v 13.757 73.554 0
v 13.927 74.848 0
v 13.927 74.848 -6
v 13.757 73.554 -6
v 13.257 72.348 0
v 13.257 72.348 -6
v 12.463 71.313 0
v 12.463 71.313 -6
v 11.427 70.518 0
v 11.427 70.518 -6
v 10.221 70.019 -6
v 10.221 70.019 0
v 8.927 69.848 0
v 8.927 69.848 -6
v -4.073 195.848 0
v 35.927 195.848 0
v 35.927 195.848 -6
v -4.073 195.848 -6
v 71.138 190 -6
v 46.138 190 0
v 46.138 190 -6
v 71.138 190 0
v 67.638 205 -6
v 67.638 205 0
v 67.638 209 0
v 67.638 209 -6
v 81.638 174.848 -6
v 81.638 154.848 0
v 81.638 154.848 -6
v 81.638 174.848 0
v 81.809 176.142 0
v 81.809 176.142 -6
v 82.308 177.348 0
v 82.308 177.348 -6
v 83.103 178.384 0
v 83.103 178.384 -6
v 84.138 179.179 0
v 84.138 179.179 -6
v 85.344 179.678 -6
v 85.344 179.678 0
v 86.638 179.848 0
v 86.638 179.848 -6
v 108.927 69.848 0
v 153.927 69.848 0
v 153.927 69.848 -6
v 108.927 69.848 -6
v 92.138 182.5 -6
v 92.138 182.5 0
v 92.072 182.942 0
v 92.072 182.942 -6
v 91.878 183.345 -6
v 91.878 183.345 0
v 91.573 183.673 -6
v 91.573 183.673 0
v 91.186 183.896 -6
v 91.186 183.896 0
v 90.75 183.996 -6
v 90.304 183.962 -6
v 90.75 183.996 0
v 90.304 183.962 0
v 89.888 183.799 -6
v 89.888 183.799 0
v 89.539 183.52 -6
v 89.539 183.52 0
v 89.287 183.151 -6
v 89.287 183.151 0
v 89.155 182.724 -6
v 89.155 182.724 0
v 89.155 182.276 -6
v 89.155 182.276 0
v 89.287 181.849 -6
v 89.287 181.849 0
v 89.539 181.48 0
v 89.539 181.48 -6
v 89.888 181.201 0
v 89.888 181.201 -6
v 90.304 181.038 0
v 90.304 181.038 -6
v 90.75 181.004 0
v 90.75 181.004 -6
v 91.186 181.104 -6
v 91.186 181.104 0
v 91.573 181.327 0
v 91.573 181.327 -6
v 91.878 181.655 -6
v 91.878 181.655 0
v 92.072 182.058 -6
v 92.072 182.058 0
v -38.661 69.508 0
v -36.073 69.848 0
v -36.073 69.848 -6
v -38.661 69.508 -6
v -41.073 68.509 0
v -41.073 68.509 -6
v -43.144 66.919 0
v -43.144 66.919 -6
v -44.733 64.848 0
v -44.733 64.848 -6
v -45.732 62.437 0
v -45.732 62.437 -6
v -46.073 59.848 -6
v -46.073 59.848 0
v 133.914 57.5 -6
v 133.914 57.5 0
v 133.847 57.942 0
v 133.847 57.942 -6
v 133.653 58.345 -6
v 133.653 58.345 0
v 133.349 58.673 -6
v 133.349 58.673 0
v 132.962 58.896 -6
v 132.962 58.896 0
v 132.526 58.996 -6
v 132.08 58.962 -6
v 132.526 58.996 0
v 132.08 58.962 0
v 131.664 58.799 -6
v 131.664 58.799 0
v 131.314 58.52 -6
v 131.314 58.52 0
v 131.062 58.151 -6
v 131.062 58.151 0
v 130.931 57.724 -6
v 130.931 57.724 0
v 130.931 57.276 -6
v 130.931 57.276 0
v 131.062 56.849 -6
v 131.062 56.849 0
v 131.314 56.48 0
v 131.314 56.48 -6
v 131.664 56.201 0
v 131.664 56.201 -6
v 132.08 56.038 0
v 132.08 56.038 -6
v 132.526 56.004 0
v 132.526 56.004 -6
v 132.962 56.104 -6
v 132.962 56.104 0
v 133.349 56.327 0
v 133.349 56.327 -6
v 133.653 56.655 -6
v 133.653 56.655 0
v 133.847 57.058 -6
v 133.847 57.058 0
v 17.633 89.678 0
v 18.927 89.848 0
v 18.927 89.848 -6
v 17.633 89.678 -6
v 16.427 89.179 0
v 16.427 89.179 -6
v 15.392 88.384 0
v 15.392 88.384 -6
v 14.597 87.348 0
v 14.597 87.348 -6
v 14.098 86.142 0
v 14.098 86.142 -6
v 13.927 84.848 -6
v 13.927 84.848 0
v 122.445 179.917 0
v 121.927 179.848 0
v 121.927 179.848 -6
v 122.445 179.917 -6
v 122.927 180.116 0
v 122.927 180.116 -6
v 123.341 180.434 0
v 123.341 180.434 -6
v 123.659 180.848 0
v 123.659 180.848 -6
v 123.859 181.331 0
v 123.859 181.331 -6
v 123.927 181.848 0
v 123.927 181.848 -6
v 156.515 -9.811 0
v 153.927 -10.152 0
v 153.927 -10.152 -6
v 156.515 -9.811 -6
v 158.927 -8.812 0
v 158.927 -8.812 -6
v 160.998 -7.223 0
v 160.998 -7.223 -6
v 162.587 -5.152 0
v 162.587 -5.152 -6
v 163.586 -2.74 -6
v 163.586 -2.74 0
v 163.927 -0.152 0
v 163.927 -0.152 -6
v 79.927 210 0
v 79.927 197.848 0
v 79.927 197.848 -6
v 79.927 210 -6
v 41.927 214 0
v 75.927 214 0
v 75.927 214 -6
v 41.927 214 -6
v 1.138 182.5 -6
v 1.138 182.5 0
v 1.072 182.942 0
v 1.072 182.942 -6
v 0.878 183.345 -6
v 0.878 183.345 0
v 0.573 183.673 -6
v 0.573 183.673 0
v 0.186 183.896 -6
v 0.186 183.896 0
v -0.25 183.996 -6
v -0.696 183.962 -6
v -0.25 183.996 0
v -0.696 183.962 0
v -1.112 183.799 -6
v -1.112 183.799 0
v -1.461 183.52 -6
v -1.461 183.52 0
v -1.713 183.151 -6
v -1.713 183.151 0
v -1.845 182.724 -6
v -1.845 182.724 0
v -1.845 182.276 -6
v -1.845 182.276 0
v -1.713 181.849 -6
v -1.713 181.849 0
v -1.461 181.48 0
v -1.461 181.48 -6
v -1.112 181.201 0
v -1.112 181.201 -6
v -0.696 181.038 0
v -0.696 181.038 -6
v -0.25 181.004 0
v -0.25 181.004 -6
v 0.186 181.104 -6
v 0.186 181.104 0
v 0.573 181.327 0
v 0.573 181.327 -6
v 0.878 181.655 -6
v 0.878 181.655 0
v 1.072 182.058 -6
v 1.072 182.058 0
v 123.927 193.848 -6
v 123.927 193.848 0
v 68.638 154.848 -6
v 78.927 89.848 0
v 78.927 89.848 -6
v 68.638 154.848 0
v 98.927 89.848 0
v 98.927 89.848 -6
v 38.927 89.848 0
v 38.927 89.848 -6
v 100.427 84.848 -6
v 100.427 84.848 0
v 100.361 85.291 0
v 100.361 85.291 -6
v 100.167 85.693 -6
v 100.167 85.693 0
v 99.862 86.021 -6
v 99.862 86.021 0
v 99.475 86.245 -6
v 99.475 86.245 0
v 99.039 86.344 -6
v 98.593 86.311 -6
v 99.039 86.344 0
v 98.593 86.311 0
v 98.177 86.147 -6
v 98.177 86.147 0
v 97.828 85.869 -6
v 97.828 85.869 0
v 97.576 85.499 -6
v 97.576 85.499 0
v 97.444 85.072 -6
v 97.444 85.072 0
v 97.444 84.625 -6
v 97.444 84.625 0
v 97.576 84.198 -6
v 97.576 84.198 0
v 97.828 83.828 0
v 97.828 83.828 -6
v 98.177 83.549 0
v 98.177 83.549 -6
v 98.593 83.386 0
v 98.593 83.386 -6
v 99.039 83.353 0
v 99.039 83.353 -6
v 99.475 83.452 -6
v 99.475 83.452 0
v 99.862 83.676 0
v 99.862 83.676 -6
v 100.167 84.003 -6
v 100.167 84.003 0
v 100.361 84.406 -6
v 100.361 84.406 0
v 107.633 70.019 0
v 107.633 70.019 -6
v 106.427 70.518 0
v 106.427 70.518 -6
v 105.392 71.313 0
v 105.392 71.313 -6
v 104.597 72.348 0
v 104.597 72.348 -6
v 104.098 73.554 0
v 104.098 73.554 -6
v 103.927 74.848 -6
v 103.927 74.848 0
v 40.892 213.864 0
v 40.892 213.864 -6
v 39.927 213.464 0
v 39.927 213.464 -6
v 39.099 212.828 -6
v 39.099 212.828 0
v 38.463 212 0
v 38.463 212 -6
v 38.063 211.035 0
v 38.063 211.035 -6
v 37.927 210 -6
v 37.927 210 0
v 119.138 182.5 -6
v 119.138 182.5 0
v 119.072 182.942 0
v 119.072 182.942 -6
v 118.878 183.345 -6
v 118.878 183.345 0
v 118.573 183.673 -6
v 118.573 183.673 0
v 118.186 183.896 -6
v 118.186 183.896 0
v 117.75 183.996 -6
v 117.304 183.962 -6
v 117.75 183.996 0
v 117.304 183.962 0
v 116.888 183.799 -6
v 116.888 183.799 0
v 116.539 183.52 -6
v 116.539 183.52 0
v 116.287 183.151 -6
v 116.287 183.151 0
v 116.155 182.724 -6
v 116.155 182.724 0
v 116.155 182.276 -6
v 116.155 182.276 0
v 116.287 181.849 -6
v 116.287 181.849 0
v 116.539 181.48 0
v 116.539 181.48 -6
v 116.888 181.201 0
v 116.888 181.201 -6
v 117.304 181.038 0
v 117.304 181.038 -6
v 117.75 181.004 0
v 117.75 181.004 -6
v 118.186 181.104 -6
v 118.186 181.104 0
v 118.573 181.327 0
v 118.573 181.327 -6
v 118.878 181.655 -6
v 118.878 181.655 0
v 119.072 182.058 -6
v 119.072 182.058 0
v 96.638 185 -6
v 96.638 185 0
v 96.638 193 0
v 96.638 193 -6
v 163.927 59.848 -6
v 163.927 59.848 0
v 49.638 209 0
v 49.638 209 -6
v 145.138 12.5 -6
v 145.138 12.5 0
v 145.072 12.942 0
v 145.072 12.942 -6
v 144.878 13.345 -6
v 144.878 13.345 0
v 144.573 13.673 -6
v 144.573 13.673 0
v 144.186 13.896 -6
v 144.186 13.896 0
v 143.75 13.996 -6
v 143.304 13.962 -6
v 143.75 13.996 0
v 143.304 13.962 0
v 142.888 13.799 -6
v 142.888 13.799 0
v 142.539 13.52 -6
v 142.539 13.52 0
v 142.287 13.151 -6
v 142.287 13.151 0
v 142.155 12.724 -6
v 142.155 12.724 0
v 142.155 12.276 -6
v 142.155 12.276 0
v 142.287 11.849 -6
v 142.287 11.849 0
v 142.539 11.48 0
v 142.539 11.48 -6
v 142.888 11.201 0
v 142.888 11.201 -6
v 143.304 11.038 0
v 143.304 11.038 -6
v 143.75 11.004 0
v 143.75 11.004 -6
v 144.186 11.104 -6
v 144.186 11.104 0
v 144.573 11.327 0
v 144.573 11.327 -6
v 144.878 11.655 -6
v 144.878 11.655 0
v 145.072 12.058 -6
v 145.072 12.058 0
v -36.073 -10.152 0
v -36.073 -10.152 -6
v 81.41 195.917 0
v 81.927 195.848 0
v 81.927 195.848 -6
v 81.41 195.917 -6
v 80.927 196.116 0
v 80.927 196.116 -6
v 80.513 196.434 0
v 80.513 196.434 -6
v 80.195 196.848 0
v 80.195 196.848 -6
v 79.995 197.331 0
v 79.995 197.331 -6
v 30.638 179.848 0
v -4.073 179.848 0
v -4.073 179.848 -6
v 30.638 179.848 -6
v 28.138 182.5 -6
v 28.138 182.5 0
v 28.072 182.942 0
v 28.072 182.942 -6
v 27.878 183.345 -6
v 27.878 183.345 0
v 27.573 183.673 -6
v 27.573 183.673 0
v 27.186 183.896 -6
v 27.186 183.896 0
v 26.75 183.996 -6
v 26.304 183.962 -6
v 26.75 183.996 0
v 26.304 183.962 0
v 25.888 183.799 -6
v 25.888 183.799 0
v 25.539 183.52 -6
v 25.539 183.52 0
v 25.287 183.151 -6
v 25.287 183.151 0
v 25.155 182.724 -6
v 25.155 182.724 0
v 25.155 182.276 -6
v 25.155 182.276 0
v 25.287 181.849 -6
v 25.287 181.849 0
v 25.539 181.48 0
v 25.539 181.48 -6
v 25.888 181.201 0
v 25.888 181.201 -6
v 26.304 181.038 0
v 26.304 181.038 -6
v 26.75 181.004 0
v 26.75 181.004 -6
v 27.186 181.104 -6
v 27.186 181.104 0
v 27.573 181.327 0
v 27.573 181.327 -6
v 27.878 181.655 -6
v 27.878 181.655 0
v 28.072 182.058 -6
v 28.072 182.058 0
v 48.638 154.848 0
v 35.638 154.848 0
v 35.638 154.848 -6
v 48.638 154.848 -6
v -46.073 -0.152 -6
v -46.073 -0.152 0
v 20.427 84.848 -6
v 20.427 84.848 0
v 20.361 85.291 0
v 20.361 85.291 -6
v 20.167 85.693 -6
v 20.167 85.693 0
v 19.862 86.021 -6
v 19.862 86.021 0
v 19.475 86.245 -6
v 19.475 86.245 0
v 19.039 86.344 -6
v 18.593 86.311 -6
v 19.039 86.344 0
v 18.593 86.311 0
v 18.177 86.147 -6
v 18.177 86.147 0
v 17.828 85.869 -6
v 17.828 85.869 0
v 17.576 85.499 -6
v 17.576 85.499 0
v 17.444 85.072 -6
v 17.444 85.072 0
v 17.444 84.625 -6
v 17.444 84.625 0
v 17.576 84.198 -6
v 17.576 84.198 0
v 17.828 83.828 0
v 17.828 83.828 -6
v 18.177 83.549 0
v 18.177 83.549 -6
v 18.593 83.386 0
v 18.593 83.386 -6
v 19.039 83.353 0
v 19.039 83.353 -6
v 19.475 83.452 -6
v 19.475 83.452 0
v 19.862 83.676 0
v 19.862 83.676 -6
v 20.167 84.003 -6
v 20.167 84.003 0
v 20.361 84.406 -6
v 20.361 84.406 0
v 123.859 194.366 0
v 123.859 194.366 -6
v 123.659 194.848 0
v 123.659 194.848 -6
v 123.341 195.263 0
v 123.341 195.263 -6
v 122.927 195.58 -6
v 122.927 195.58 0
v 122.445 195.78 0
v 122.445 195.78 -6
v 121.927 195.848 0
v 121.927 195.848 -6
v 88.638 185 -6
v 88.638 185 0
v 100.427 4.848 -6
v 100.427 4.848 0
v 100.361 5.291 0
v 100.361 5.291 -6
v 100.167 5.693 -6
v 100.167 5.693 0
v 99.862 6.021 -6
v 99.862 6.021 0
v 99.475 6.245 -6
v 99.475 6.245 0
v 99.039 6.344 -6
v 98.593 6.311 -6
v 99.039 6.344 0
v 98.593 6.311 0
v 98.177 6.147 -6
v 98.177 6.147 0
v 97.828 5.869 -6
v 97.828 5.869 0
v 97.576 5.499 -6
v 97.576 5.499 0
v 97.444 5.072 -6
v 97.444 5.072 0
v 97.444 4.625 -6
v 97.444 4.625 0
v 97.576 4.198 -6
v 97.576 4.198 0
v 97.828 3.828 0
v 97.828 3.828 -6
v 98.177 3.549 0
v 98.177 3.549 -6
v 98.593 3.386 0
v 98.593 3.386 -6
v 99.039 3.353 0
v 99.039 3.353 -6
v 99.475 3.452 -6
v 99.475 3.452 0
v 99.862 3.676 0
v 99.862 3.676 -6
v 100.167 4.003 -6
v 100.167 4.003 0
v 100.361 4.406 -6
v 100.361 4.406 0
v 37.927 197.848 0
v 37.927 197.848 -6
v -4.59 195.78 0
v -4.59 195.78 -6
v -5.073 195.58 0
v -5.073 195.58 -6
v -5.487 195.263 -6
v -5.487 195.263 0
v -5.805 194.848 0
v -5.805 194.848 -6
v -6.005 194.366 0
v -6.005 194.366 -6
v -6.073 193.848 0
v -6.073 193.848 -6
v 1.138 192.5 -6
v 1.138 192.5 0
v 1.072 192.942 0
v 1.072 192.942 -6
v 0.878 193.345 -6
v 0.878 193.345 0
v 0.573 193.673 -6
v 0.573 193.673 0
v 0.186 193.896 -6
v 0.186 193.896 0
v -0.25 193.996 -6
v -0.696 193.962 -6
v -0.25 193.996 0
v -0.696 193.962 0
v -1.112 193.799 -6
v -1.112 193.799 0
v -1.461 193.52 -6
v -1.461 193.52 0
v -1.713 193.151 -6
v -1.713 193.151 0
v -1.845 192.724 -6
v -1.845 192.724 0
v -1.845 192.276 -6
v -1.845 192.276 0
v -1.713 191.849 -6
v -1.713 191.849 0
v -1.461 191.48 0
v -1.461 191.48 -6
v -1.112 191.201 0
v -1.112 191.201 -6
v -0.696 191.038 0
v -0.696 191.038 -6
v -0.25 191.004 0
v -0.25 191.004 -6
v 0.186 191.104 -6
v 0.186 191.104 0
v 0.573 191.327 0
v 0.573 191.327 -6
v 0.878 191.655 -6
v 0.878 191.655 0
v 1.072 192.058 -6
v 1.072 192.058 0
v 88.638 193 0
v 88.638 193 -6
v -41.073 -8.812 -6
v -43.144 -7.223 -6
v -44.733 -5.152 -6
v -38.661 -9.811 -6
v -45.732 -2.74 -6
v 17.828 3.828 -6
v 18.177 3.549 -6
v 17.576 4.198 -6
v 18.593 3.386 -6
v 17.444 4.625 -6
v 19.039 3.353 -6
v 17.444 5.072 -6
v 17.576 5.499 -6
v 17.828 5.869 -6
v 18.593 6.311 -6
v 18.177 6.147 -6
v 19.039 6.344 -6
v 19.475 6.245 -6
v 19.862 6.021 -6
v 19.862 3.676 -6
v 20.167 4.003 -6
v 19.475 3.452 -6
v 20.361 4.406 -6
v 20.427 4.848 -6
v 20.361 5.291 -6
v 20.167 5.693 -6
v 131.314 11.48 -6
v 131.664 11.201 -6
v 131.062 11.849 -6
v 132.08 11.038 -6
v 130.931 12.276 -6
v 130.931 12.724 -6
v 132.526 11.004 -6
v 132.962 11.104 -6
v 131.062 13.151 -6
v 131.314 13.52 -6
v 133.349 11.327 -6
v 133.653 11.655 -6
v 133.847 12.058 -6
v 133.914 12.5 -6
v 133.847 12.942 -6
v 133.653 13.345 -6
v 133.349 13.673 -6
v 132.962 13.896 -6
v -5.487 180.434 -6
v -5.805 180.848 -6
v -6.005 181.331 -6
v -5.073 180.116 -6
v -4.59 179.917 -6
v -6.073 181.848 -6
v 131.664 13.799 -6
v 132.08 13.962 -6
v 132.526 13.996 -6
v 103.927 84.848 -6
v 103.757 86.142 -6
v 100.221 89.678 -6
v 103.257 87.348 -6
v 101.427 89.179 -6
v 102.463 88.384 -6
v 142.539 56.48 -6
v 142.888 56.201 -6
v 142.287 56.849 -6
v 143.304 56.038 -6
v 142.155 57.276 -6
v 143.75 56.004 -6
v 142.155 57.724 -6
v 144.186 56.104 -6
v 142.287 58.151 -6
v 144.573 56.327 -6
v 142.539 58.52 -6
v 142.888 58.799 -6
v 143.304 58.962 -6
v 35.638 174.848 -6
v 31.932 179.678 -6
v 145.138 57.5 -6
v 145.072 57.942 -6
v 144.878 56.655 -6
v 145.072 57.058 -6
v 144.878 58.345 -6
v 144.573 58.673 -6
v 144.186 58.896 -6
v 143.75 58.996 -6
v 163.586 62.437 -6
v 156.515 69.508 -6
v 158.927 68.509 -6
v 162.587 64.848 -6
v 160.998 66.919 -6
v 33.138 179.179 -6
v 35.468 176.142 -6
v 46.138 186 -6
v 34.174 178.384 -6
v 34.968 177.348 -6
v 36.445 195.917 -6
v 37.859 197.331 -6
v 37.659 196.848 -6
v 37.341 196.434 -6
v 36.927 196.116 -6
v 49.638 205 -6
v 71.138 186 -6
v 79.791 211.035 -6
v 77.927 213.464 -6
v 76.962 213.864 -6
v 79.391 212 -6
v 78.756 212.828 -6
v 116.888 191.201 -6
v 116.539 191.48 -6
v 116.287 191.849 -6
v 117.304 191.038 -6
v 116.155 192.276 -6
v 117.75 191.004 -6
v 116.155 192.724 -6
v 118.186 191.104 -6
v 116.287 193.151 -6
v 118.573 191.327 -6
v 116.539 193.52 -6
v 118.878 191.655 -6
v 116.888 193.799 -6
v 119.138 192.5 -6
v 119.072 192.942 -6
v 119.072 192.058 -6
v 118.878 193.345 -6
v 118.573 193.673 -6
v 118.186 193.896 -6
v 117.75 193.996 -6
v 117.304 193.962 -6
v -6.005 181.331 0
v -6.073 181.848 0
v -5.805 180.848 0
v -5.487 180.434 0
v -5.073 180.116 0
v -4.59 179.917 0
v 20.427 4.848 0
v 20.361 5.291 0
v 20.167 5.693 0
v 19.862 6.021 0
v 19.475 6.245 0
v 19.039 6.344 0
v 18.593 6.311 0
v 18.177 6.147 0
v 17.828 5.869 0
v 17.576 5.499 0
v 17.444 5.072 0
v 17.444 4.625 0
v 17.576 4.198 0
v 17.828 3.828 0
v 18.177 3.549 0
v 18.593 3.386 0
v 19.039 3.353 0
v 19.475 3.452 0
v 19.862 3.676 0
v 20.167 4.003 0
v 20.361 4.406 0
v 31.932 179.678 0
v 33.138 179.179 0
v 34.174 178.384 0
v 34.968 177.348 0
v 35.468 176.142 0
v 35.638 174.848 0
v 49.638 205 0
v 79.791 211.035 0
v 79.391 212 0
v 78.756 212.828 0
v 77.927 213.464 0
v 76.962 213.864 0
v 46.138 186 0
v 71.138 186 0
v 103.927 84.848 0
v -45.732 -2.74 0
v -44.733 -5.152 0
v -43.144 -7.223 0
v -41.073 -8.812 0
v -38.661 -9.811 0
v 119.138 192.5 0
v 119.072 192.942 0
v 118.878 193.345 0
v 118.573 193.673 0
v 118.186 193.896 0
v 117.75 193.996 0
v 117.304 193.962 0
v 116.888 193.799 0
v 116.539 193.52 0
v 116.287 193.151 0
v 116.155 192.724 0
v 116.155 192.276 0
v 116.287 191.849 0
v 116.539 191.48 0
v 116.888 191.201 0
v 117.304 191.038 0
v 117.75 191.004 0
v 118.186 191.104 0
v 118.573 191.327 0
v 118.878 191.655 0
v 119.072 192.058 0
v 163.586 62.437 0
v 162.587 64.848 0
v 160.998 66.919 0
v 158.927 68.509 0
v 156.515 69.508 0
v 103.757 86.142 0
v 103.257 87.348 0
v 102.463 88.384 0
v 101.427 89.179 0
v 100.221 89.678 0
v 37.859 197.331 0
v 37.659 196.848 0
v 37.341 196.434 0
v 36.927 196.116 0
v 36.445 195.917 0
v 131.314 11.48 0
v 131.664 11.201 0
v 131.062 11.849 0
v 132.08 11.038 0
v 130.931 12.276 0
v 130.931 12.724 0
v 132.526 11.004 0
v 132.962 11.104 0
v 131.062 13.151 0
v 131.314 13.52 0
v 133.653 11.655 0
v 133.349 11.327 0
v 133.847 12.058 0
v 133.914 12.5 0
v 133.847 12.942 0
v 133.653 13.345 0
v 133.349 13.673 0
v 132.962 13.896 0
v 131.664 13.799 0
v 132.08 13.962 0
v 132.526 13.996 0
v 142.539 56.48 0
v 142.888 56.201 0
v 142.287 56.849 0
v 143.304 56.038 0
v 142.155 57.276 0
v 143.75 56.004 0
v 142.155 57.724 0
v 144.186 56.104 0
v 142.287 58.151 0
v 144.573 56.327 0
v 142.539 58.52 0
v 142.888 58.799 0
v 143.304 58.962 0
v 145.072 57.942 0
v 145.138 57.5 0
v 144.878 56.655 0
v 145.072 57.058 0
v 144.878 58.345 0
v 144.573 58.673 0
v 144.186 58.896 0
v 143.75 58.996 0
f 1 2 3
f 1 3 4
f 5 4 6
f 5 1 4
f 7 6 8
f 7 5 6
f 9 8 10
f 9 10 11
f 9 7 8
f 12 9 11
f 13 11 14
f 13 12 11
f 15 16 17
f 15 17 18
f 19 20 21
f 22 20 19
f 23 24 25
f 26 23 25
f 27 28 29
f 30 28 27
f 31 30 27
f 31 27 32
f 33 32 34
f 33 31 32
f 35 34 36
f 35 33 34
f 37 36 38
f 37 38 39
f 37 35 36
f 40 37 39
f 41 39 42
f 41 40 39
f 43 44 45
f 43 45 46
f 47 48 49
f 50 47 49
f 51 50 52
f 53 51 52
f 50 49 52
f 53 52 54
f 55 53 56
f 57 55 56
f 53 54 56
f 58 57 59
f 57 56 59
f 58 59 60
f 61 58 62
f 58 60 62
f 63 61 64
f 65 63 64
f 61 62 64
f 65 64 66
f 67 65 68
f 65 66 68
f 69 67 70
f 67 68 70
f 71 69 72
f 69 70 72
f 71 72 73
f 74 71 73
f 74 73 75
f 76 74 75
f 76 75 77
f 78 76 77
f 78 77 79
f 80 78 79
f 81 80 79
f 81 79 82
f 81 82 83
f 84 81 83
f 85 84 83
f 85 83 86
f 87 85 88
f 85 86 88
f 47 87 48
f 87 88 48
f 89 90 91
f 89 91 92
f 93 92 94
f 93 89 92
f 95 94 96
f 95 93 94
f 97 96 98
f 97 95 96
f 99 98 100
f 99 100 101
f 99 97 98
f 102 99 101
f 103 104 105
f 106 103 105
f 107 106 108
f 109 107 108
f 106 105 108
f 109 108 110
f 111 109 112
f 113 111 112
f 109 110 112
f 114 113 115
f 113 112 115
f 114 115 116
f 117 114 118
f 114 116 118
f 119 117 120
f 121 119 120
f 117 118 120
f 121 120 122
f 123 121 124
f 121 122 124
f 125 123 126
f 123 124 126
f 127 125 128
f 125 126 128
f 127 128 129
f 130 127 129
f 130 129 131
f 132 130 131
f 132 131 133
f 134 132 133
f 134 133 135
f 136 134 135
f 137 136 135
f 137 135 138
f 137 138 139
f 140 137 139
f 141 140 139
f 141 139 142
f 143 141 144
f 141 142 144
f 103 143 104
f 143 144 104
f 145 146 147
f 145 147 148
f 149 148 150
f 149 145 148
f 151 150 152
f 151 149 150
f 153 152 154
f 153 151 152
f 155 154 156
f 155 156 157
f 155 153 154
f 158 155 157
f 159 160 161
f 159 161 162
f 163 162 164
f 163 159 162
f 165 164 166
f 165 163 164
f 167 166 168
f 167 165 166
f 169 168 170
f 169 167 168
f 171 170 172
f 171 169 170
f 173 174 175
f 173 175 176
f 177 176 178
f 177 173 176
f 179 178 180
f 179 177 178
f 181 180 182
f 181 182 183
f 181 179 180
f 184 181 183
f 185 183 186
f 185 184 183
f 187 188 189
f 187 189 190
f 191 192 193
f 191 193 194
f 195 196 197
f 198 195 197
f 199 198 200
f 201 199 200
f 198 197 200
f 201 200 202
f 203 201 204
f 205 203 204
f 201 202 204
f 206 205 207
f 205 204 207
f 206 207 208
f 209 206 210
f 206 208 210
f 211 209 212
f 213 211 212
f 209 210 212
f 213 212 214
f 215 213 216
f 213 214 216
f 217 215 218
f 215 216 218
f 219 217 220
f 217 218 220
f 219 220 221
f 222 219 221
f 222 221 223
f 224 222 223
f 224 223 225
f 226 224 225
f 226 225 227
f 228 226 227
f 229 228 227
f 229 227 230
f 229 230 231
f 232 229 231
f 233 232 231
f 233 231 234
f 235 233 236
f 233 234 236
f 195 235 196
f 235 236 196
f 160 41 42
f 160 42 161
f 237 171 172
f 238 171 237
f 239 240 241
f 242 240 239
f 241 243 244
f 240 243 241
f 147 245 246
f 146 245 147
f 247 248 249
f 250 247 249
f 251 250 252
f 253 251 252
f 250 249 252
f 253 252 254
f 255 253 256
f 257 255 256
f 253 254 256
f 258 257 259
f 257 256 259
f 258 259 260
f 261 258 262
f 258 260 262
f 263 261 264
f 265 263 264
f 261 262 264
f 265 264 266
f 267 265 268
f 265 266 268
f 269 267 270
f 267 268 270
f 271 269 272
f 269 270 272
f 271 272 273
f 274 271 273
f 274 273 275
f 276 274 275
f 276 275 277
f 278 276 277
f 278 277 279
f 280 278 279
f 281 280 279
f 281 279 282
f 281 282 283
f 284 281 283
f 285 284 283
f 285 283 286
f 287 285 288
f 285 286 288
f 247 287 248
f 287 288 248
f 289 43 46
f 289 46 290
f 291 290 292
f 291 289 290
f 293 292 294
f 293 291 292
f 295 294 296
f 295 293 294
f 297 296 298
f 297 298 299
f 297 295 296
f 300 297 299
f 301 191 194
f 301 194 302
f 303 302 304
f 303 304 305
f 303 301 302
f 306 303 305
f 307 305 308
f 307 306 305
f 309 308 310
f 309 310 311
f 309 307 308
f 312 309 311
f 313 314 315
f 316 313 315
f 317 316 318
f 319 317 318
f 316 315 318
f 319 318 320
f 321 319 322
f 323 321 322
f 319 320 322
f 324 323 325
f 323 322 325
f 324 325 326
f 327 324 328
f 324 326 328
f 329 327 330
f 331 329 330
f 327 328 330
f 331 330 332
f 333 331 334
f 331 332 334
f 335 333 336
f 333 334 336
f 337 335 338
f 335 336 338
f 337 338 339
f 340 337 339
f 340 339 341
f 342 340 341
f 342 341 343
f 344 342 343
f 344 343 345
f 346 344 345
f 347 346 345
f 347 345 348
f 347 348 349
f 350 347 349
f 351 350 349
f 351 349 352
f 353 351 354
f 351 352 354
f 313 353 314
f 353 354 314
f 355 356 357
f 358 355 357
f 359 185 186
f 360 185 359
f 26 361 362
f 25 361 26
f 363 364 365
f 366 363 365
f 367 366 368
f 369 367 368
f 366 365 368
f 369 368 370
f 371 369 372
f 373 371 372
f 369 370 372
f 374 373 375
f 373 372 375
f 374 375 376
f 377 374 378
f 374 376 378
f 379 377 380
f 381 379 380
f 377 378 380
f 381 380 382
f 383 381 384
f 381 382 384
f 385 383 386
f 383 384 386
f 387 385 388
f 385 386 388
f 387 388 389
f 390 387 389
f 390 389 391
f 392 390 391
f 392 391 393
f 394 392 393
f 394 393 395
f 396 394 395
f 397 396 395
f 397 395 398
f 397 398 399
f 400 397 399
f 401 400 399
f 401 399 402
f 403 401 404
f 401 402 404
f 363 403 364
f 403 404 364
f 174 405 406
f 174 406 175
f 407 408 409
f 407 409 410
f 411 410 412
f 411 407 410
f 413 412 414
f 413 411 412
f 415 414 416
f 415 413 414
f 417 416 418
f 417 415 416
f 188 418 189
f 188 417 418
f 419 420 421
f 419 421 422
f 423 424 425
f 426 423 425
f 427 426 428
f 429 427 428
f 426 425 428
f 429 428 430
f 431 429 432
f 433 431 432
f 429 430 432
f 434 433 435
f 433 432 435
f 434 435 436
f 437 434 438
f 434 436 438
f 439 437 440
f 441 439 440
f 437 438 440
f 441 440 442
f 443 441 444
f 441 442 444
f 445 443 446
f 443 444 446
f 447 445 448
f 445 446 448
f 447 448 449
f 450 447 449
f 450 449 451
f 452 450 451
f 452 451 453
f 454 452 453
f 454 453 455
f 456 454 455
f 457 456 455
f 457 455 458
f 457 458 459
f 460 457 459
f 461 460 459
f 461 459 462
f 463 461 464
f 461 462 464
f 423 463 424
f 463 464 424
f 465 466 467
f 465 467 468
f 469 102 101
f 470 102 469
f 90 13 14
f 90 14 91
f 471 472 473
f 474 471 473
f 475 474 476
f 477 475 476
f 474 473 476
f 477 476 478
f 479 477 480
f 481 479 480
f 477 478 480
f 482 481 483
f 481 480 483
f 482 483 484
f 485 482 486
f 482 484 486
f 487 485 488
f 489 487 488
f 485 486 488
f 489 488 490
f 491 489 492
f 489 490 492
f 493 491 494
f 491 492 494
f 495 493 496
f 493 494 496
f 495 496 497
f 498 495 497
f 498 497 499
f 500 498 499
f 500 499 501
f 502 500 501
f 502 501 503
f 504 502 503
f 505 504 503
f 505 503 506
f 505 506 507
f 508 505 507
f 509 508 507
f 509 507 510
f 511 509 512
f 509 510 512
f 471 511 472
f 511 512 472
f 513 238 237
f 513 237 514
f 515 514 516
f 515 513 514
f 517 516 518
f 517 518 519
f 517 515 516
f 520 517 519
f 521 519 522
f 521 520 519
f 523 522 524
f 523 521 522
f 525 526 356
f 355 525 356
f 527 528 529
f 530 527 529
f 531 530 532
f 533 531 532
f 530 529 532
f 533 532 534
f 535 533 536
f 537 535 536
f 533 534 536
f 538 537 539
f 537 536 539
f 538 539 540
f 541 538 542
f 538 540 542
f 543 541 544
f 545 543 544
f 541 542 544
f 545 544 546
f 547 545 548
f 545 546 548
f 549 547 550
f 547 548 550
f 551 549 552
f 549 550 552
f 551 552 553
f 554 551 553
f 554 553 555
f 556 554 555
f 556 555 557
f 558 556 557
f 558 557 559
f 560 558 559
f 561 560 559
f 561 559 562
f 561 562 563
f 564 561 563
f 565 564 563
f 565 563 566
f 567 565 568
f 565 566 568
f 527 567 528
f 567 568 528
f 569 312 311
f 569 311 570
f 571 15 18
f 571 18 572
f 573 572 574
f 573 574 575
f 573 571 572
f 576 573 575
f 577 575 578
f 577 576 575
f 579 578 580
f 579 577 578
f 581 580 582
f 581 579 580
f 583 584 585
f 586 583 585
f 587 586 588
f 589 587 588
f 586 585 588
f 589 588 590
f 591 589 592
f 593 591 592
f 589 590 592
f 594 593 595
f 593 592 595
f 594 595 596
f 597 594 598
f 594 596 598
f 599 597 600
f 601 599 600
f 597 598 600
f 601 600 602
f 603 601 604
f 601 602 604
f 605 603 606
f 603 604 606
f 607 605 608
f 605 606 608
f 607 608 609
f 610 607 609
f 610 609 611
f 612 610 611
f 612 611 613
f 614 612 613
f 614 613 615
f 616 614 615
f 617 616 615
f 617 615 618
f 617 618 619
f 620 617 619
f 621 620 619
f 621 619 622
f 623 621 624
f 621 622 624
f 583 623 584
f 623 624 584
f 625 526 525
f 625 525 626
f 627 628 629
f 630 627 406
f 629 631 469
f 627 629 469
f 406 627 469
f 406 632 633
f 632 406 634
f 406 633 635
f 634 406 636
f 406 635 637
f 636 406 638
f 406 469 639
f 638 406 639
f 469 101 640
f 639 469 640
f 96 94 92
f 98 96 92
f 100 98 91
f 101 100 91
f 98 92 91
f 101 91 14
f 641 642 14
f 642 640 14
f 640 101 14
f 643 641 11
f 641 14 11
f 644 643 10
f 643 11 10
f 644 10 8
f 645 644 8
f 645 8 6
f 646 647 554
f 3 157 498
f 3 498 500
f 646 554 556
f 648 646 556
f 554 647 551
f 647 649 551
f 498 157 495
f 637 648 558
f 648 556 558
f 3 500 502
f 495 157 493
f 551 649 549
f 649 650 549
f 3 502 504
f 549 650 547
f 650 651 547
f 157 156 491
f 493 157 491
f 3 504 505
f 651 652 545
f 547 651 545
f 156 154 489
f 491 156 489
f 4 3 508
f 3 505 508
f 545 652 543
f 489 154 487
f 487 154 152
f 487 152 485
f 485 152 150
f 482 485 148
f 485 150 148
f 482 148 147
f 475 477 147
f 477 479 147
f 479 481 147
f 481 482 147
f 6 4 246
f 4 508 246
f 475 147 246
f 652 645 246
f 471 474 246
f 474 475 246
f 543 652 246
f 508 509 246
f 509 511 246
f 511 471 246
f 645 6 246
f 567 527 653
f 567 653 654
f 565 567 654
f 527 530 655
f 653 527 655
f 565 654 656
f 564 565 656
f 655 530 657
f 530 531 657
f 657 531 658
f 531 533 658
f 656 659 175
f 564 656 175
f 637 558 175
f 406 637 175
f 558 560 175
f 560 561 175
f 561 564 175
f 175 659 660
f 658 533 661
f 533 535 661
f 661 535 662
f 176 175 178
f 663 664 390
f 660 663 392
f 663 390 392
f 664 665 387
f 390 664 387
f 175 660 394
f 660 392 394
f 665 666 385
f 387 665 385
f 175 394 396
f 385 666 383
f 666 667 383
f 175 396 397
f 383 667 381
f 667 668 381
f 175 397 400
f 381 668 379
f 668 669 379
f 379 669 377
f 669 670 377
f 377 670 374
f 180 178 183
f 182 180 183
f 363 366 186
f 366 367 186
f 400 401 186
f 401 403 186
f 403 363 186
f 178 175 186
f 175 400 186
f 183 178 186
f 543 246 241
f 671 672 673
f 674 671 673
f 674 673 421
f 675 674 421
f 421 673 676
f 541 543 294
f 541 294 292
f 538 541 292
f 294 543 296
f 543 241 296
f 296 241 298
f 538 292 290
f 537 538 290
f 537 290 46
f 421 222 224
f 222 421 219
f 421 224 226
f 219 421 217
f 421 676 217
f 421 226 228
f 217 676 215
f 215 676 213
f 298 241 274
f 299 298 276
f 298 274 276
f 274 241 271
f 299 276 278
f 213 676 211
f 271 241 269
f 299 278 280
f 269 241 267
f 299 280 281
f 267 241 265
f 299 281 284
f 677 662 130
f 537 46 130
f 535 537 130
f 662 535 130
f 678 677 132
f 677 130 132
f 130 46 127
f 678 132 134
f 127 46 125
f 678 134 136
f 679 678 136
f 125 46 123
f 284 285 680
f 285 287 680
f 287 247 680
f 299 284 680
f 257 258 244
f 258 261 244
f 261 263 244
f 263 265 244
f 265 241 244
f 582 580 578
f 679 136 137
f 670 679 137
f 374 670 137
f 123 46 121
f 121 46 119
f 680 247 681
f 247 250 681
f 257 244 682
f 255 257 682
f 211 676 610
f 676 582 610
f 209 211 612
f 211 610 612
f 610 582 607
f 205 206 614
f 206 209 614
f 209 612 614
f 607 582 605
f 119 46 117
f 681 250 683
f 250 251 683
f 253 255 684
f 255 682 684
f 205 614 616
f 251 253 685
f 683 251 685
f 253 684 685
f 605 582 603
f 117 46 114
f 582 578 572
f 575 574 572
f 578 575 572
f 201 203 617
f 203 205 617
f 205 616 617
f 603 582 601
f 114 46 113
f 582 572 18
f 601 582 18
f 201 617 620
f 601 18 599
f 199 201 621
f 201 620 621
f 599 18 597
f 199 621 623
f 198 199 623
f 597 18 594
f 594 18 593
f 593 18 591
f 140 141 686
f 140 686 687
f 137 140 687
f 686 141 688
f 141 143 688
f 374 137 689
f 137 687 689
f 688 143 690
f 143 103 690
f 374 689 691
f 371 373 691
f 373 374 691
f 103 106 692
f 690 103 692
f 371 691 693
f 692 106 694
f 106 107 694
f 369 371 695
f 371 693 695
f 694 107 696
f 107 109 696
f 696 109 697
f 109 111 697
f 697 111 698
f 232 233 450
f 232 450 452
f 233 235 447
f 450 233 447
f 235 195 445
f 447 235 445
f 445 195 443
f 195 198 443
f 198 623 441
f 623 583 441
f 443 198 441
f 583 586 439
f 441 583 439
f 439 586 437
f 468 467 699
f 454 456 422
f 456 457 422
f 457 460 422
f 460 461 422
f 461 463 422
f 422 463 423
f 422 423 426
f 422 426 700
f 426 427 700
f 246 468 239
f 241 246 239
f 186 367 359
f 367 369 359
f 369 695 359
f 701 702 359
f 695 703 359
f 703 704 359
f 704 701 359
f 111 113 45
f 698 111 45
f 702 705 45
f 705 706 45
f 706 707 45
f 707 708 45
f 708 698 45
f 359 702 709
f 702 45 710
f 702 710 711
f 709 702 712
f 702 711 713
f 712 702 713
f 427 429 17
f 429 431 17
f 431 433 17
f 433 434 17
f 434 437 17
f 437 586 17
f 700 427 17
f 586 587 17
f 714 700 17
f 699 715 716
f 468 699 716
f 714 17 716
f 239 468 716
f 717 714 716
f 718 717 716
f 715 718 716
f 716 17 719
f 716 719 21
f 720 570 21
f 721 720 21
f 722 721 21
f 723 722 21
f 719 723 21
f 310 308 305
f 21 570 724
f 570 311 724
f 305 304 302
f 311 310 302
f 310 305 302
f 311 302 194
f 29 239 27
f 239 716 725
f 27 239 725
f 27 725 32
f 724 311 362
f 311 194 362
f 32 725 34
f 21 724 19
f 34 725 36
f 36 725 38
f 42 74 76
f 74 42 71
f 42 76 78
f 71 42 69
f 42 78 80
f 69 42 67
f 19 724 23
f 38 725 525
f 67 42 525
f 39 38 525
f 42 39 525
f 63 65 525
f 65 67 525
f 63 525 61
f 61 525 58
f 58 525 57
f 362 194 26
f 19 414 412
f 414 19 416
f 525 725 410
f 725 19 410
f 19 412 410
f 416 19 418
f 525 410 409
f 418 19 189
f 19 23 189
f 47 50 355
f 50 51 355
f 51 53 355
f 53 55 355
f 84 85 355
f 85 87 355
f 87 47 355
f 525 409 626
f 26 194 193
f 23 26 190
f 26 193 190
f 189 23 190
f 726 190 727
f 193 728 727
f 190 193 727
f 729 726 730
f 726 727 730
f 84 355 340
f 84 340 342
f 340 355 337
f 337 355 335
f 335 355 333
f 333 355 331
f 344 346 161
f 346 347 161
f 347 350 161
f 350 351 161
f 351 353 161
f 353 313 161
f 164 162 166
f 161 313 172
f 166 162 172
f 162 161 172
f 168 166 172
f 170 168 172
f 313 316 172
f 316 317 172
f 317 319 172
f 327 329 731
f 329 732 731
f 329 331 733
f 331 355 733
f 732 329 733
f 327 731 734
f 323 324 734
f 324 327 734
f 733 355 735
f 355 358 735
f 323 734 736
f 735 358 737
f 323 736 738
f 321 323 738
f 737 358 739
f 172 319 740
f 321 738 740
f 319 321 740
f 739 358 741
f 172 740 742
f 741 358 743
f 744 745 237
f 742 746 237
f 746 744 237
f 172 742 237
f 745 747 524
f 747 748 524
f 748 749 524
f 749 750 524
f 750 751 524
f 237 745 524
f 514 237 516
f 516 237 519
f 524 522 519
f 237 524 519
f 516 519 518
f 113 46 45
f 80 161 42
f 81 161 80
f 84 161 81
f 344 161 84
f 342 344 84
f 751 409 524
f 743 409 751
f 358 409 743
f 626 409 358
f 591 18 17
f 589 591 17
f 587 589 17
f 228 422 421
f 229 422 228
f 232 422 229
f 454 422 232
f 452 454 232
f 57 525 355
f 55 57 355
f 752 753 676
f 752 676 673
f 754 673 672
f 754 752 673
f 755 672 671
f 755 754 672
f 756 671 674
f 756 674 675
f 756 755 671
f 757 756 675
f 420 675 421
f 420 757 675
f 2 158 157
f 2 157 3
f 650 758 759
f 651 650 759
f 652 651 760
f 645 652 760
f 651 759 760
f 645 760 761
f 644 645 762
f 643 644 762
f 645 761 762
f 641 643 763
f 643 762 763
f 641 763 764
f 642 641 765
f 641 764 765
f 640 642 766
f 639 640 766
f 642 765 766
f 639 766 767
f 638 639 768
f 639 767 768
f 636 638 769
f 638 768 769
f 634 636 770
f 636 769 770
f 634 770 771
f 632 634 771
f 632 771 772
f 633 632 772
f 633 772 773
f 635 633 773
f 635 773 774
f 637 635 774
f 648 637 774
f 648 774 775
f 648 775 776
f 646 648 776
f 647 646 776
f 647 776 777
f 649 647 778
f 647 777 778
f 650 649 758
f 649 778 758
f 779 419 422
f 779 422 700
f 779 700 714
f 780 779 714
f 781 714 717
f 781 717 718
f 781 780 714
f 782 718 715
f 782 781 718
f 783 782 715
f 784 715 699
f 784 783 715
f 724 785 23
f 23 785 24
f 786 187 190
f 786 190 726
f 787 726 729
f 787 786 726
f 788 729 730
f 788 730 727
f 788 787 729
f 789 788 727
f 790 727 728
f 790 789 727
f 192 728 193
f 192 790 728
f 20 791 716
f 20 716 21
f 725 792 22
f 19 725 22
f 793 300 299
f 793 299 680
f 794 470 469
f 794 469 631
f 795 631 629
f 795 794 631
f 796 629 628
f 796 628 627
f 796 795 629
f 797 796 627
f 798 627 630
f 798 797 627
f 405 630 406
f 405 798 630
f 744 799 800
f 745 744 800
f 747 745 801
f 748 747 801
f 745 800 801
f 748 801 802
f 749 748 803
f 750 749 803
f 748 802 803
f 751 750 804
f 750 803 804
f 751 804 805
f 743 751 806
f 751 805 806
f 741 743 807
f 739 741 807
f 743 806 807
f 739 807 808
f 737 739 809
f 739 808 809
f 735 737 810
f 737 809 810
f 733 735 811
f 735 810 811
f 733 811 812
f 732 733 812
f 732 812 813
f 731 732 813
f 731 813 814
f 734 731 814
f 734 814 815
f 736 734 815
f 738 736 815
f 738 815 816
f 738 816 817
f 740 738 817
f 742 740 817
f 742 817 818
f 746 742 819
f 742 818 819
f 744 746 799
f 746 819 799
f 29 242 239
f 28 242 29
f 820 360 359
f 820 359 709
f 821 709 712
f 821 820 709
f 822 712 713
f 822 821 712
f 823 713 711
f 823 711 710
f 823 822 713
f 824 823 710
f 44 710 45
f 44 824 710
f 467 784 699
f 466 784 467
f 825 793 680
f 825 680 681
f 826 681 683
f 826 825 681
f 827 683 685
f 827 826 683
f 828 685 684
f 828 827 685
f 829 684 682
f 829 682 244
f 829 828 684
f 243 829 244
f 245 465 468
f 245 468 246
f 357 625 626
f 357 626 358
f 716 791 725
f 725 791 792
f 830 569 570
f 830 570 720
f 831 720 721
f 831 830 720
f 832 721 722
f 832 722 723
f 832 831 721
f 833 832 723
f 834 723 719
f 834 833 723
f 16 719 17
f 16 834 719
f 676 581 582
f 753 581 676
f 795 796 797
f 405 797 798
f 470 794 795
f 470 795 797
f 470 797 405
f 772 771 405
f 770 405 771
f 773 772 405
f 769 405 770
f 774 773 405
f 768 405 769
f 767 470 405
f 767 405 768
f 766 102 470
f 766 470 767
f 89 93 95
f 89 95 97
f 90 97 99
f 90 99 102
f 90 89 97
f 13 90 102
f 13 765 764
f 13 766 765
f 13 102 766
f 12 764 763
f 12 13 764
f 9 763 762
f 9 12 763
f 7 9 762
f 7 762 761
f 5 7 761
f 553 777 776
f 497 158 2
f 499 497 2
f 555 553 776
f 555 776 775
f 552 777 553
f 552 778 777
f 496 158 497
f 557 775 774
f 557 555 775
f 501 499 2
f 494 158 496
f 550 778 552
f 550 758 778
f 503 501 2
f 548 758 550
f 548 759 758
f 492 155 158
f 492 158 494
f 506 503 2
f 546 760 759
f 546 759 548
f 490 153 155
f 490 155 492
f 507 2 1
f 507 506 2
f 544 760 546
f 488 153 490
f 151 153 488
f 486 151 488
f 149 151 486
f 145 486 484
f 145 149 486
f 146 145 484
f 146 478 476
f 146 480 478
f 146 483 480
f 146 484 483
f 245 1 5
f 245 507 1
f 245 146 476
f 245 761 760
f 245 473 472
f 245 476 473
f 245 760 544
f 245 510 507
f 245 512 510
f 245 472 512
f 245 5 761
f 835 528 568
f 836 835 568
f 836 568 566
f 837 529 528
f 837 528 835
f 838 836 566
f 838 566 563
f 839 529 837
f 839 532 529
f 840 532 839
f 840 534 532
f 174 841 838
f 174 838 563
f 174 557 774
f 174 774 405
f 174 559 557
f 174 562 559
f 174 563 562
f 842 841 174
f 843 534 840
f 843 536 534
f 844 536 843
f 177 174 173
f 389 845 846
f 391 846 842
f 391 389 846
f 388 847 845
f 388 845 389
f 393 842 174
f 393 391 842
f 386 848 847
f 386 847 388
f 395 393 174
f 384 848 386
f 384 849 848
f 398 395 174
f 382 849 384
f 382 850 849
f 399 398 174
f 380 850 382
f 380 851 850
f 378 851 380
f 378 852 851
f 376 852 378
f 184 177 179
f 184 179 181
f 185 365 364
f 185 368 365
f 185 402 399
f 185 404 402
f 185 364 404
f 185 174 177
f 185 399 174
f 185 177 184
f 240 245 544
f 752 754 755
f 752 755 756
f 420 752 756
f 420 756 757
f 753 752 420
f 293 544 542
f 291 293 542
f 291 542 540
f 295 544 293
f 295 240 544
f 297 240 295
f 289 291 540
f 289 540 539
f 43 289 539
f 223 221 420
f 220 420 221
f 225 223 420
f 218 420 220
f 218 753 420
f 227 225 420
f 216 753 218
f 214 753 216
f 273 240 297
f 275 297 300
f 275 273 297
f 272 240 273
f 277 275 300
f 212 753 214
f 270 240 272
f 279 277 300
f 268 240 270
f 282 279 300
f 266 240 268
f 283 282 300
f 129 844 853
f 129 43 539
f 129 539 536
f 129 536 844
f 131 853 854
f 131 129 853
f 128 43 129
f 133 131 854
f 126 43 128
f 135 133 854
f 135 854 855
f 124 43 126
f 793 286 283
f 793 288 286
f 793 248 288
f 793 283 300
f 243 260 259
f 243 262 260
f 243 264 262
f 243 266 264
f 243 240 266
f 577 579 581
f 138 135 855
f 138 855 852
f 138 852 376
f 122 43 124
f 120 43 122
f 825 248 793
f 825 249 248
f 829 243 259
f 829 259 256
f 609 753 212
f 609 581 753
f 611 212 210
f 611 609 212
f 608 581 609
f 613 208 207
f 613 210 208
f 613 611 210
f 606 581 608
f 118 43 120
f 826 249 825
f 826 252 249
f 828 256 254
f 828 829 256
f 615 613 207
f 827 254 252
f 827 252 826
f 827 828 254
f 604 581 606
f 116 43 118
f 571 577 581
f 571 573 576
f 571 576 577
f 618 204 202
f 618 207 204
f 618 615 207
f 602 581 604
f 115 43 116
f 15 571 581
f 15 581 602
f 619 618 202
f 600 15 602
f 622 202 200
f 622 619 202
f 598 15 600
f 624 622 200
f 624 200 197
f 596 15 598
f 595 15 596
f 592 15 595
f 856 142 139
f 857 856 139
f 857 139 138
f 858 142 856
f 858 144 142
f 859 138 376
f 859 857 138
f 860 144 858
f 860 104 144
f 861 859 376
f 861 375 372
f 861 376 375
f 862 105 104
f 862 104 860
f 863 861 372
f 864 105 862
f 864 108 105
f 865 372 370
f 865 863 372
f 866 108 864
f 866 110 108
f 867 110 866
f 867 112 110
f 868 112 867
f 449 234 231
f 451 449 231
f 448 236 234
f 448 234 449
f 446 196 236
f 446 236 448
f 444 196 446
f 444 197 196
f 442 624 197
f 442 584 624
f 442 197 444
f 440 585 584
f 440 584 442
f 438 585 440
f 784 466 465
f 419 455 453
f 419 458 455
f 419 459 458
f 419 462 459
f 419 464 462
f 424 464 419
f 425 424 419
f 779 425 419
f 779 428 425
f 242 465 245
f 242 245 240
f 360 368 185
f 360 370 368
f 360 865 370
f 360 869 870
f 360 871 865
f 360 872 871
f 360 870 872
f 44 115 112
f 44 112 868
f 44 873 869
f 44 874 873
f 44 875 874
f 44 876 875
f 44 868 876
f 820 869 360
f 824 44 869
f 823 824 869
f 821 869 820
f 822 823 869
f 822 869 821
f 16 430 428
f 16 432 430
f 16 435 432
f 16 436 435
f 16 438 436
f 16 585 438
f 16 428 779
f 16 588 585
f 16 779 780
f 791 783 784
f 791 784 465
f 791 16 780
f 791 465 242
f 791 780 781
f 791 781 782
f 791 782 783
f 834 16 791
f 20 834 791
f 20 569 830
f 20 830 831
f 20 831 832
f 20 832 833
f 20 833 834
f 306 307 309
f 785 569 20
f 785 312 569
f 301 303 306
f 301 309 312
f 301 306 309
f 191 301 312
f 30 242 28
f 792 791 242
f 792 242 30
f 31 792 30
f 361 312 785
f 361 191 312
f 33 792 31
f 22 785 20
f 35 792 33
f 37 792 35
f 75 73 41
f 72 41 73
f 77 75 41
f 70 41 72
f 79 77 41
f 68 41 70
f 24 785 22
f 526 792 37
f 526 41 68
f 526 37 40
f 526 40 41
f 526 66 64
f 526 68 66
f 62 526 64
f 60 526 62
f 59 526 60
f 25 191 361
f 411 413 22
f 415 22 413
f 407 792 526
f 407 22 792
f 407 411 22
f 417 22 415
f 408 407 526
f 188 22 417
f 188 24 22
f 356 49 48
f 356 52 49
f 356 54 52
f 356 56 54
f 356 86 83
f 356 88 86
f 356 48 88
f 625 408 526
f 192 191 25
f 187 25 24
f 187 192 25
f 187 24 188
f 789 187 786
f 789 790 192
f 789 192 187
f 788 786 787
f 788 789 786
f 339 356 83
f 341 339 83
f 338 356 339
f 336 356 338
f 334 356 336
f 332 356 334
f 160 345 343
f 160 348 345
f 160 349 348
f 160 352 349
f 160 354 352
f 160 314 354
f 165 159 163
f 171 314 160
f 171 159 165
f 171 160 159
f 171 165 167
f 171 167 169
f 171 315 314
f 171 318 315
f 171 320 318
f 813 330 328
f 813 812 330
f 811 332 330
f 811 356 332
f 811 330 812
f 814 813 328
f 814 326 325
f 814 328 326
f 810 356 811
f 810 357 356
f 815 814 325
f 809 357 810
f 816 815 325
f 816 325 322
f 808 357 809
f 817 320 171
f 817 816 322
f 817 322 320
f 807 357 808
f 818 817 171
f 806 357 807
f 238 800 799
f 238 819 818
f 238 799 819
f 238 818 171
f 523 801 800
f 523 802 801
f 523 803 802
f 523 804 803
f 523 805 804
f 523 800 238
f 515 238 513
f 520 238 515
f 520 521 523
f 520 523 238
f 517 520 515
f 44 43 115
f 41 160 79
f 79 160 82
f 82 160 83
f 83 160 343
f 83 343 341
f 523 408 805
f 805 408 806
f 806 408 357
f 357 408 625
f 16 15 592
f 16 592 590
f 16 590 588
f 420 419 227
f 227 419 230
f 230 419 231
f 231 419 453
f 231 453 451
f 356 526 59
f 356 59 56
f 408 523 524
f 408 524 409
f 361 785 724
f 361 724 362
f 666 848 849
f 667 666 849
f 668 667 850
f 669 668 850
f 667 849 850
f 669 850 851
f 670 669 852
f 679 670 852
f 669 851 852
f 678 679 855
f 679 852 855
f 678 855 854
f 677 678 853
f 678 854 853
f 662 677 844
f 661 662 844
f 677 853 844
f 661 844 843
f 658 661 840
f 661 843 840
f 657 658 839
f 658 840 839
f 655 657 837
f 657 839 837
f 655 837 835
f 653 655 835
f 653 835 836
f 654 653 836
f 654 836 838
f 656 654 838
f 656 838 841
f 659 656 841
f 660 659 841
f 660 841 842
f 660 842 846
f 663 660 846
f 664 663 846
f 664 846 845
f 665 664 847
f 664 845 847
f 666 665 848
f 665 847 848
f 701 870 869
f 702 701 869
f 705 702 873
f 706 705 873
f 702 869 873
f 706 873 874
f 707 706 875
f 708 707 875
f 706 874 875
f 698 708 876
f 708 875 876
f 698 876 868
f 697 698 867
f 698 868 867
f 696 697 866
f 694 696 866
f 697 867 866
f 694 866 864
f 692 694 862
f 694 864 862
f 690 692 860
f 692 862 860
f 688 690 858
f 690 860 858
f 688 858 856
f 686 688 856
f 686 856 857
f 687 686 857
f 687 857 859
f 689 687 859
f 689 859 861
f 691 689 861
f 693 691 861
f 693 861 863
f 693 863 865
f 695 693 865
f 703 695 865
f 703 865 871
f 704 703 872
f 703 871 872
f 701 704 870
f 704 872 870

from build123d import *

# Parameters (mm, degrees)
SKETCH1_R           = 1.5
SKETCH1_W           = 8
SKETCH1_H           = 8
SKETCH1_W_2         = 25
SKETCH1_H_2         = 4
SKETCH1_W_3         = 18
BOSS_EXTRUDE3_DEPTH = 6
SKETCH1_9_R         = 1.5
CUT_EXTRUDE2_DEPTH  = 6


with BuildPart() as part:
    # Sketch1 → Boss-Extrude3 (new body)
    with BuildSketch(Plane.XY):
        with BuildLine():
            Line((-36.07279856, -10.151608153), (153.92720144, -10.151608153))
            ThreePointArc((153.92720144, -10.151608153), (160.998269252, -7.222675965), (163.92720144, -0.151608153))
            Line((163.92720144, -0.151608153), (163.92720144, 59.848391847))
            ThreePointArc((163.92720144, 59.848391847), (160.998269252, 66.919459659), (153.92720144, 69.848391847))
            Line((153.92720144, 69.848391847), (108.92720144, 69.848391847))
            ThreePointArc((108.92720144, 69.848391847), (105.391667534, 71.312857941), (103.92720144, 74.848391847))
            Line((103.92720144, 74.848391847), (103.92720144, 84.848391847))
            ThreePointArc((103.92720144, 84.848391847), (102.462735346, 88.383925753), (98.92720144, 89.848391847))
            Line((98.92720144, 89.848391847), (78.92720144, 89.848391847))
            Line((78.92720144, 89.848391847), (68.638210005, 154.848391847))
            Line((68.638210005, 154.848391847), (81.638210005, 154.848391847))
            Line((81.638210005, 154.848391847), (81.638210005, 174.848391847))
            ThreePointArc((81.638210005, 174.848391847), (83.102676099, 178.383925753), (86.638210005, 179.848391847))
            Line((86.638210005, 179.848391847), (121.92720144, 179.848391847))
            ThreePointArc((121.92720144, 179.848391847), (123.341415002, 180.434178284), (123.92720144, 181.848391847))
            Line((123.92720144, 181.848391847), (123.92720144, 193.848391847))
            ThreePointArc((123.92720144, 193.848391847), (123.341415002, 195.262605409), (121.92720144, 195.848391847))
            Line((121.92720144, 195.848391847), (81.92720144, 195.848391847))
            ThreePointArc((81.92720144, 195.848391847), (80.512987878, 196.434178284), (79.92720144, 197.848391847))
            Line((79.92720144, 197.848391847), (79.92720144, 210))
            ThreePointArc((79.92720144, 210), (78.755628565, 212.828427125), (75.92720144, 214))
            Line((75.92720144, 214), (41.92720144, 214))
            ThreePointArc((41.92720144, 214), (39.098774315, 212.828427125), (37.92720144, 210))
            Line((37.92720144, 210), (37.92720144, 197.848391847))
            ThreePointArc((37.92720144, 197.848391847), (37.341415002, 196.434178284), (35.92720144, 195.848391847))
            Line((35.92720144, 195.848391847), (-4.07279856, 195.848391847))
            ThreePointArc((-4.07279856, 195.848391847), (-5.487012122, 195.262605409), (-6.07279856, 193.848391847))
            Line((-6.07279856, 193.848391847), (-6.07279856, 181.848391847))
            ThreePointArc((-6.07279856, 181.848391847), (-5.487012122, 180.434178284), (-4.07279856, 179.848391847))
            Line((-4.07279856, 179.848391847), (30.638210005, 179.848391847))
            ThreePointArc((30.638210005, 179.848391847), (34.173743911, 178.383925753), (35.638210005, 174.848391847))
            Line((35.638210005, 174.848391847), (35.638210005, 154.848391847))
            Line((35.638210005, 154.848391847), (48.638210005, 154.848391847))
            Line((48.638210005, 154.848391847), (38.92720144, 89.848391847))
            Line((38.92720144, 89.848391847), (18.92720144, 89.848391847))
            ThreePointArc((18.92720144, 89.848391847), (15.391667534, 88.383925753), (13.92720144, 84.848391847))
            Line((13.92720144, 84.848391847), (13.92720144, 74.848391847))
            ThreePointArc((13.92720144, 74.848391847), (12.462735346, 71.312857941), (8.92720144, 69.848391847))
            Line((8.92720144, 69.848391847), (-36.07279856, 69.848391847))
            ThreePointArc((-36.07279856, 69.848391847), (-43.143866372, 66.919459659), (-46.07279856, 59.848391847))
            Line((-46.07279856, 59.848391847), (-46.07279856, -0.151608153))
            ThreePointArc((-46.07279856, -0.151608153), (-43.143866372, -7.222675965), (-36.07279856, -10.151608153))
        make_face()
        with Locations((143.638210005, 57.5)):
            Circle(SKETCH1_R, mode=Mode.SUBTRACT)
        with Locations((132.413840271, 57.5)):
            Circle(SKETCH1_R, mode=Mode.SUBTRACT)
        with Locations((132.413840271, 12.5)):
            Circle(SKETCH1_R, mode=Mode.SUBTRACT)
        with Locations((143.638210005, 12.5)):
            Circle(SKETCH1_R, mode=Mode.SUBTRACT)
        with Locations((117.638210005, 182.5)):
            Circle(SKETCH1_R, mode=Mode.SUBTRACT)
        with Locations((117.638210005, 192.5)):
            Circle(SKETCH1_R, mode=Mode.SUBTRACT)
        with Locations((-0.361789995, 182.5)):
            Circle(SKETCH1_R, mode=Mode.SUBTRACT)
        with Locations((-0.361789995, 192.5)):
            Circle(SKETCH1_R, mode=Mode.SUBTRACT)
        with Locations((26.638210005, 182.5)):
            Circle(SKETCH1_R, mode=Mode.SUBTRACT)
        with Locations((90.638210005, 182.5)):
            Circle(SKETCH1_R, mode=Mode.SUBTRACT)
        with Locations((92.638210005, 189)):
            Rectangle(SKETCH1_W, SKETCH1_H, mode=Mode.SUBTRACT)
        with Locations((58.638210005, 188)):
            Rectangle(SKETCH1_W_2, SKETCH1_H_2, mode=Mode.SUBTRACT)
        with Locations((58.638210005, 207)):
            Rectangle(SKETCH1_W_3, SKETCH1_H_2, mode=Mode.SUBTRACT)
    extrude(amount=-BOSS_EXTRUDE3_DEPTH)

    # Sketch1<9> → Cut-Extrude2 (cut)
    with BuildSketch(Plane.XY):
        with Locations((98.92720144, 84.848391847)):
            Circle(SKETCH1_9_R)
        with Locations((18.92720144, 84.848391847)):
            Circle(SKETCH1_9_R)
        with Locations((98.92720144, 4.848391847)):
            Circle(SKETCH1_9_R)
        with Locations((18.92720144, 4.848391847)):
            Circle(SKETCH1_9_R)
    extrude(amount=-CUT_EXTRUDE2_DEPTH, mode=Mode.SUBTRACT)


solid = part.part
